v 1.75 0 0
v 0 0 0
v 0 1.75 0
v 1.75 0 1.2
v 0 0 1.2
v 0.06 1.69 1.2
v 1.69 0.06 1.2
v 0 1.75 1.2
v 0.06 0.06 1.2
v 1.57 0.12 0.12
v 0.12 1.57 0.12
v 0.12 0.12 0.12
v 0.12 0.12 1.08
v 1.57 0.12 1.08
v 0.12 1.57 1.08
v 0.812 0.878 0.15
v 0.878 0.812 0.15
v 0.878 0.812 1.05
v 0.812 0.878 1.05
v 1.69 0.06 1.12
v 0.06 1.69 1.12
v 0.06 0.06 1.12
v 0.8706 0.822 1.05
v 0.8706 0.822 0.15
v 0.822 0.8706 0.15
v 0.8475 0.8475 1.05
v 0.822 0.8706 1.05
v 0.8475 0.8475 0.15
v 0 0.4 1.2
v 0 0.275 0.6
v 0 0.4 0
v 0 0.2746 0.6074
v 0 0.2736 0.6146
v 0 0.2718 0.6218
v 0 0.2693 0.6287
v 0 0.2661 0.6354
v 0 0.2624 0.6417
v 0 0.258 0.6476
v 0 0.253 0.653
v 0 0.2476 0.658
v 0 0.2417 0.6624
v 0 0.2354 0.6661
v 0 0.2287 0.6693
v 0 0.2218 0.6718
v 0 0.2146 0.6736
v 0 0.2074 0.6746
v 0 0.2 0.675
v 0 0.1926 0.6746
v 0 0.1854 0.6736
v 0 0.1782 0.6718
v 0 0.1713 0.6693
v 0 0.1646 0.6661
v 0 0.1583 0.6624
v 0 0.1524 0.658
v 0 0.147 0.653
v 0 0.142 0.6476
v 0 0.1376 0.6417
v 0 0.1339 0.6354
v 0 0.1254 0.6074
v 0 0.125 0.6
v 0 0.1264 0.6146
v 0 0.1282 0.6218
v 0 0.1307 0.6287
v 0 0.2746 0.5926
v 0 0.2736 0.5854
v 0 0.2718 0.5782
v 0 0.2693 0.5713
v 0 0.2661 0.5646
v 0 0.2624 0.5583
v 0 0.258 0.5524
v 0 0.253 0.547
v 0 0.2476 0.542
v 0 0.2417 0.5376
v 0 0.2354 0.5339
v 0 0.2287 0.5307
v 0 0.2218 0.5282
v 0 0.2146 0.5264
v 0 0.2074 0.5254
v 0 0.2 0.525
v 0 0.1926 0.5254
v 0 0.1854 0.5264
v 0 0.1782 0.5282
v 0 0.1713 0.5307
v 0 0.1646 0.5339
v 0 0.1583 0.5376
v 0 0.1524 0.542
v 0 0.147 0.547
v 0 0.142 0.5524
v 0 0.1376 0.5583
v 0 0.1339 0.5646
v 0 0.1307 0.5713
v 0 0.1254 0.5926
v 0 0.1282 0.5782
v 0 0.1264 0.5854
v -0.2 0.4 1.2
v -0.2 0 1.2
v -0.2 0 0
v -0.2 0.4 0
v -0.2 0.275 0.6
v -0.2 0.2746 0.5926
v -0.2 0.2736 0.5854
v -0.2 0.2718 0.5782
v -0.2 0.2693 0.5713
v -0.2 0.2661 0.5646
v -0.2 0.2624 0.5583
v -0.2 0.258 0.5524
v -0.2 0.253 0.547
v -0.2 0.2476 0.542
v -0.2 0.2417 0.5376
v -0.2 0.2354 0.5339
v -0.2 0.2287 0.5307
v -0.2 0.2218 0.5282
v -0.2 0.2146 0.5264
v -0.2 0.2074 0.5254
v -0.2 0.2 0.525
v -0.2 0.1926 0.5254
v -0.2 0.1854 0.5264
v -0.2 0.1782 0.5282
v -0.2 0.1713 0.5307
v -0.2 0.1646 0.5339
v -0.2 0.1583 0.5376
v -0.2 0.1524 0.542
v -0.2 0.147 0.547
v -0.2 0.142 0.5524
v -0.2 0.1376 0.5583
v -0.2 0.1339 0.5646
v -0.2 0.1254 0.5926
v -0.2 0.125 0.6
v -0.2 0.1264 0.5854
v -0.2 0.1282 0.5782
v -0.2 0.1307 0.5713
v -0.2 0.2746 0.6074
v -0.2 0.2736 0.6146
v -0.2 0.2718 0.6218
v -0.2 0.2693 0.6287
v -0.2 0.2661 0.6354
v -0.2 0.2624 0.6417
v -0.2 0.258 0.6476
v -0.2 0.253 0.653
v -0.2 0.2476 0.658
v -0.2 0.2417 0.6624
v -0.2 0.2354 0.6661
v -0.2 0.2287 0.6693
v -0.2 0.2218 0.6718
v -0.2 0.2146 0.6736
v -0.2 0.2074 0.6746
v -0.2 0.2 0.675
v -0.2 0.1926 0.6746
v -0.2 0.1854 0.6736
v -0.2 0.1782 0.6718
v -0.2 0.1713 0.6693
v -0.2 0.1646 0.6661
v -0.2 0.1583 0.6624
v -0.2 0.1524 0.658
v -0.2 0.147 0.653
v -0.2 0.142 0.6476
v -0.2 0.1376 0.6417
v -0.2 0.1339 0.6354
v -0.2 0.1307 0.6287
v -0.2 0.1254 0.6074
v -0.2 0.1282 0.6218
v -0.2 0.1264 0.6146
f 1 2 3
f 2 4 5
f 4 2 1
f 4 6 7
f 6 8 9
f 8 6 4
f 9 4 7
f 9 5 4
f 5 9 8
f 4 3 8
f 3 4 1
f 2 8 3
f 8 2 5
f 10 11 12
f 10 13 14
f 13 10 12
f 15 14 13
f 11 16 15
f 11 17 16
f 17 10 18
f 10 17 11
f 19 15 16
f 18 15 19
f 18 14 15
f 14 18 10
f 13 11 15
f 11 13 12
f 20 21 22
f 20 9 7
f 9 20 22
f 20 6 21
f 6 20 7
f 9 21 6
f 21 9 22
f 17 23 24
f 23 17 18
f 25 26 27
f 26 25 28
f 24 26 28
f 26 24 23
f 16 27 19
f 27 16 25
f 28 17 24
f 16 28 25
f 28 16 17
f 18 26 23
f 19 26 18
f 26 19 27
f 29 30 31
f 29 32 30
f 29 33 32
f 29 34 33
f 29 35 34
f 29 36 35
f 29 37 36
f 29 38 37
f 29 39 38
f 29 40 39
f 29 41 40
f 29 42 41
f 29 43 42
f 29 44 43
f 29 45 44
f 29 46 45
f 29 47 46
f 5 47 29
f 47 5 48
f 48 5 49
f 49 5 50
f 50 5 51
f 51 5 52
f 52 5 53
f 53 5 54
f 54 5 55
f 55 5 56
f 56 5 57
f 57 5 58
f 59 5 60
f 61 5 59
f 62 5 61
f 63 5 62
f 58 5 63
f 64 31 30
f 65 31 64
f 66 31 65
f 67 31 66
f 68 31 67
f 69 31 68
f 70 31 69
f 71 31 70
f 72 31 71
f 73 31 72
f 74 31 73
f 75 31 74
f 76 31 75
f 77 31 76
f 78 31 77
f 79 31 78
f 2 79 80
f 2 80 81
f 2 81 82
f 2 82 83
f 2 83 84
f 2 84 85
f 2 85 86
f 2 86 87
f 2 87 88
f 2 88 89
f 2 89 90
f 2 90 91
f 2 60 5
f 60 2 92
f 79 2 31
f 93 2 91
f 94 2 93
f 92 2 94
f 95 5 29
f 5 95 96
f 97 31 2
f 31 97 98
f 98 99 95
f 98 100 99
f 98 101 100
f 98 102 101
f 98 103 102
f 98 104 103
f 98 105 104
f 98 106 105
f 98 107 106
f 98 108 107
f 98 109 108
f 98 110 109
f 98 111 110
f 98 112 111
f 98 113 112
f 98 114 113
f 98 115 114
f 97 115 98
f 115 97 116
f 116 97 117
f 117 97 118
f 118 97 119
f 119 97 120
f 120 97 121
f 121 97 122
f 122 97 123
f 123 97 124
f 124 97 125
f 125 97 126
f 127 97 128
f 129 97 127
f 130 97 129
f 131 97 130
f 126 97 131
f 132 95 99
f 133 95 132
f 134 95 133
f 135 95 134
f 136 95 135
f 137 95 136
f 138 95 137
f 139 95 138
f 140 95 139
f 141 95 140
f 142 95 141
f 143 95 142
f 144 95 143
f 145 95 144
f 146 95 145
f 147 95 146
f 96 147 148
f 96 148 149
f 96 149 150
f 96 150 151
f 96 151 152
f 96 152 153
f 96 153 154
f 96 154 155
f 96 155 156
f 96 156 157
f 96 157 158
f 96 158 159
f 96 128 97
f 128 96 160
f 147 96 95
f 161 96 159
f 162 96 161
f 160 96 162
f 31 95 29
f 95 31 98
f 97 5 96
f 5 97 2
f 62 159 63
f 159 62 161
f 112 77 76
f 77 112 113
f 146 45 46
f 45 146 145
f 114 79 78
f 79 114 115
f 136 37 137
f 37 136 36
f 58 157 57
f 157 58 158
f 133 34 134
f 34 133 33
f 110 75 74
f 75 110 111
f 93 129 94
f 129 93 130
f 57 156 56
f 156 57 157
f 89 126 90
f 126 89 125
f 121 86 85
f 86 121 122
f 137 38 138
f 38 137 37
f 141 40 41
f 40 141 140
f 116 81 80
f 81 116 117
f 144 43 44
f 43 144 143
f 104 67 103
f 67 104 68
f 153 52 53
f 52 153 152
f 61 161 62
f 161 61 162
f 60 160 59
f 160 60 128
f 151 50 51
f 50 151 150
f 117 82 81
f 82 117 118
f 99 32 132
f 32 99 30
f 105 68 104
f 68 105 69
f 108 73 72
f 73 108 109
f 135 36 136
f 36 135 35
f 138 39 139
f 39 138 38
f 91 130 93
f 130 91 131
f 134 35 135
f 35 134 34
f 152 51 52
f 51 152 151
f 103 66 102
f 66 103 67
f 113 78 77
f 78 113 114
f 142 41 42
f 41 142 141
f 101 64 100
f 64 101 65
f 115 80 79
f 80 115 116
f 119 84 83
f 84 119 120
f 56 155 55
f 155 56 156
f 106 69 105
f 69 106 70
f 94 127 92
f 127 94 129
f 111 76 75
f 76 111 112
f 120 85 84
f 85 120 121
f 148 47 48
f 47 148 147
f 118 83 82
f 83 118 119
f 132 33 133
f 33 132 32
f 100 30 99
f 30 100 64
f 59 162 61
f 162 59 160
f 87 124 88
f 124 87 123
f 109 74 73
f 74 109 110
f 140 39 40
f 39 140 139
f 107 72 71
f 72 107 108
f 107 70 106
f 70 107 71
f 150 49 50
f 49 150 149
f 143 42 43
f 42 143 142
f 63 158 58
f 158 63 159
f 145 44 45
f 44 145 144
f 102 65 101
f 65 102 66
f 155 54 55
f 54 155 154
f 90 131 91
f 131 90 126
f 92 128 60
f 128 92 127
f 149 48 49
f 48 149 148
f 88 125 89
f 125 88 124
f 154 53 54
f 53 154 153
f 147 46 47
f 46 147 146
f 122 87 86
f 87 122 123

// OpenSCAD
// Maritime Safety Infrastructure & Fleet Readiness Tracking Module
// Resolution for geometric roundings
$fn = 64; 

// Ruggedized Marine Form Factors (Engineered to withstand heavy sea spray and vibration)
casing_width   = 1.75; // Inches
casing_height  = 1.75; 
casing_length  = 1.20; 
hull_thickness = 0.12; // 3mm reinforced marine-grade protective shell

module maritime_safety_shield() {
    difference() {
        // 1. Primary Structural Chassis Basin (Molded in High-Visibility Safety Red)
        linear_extrude(height = casing_length) {
            polygon(points=[[0,0], [casing_width,0], [0,casing_height]]);
        }
        
        // 2. Sealed Internal Electronic Sanctuary Cavity (Isolates telemetry links)
        translate([hull_thickness, hull_thickness, hull_thickness])
            linear_extrude(height = casing_length - (hull_thickness * 2)) {
                polygon(points=[[0,0], [casing_width - 0.30, 0], [0, casing_height - 0.30]]);
            }
            
        // 3. Continuous Interlocking Gasket Labyrinth Track
        // Seats salt-resistant Viton rubber seals against high-pressure washdowns
        translate([0.06, 0.06, casing_length - 0.08])
            linear_extrude(height = 0.10) {
                polygon(points=[[0,0], [casing_width - 0.12, 0], [0, casing_height - 0.12]]);
            }

        // 4. IP68 Threaded Panel-Mount Data Port Clearance
        // Circular profile designed for heavy-duty threaded marine brass collars
        translate([0.60, 0.60, casing_length / 2])
            rotate([0, 0, -45])
                cylinder(h = 0.9, d = 0.70, center=true); // Sized for double-gasket bulkhead couplers
    }
    
    // 5. Heavy-Duty External Mounting Flanges (For bulkhead or equipment rack fastening)
    translate([-0.20, 0, 0])
        difference() {
            cube([0.20, 0.40, casing_length]);
            translate([0.10, 0.20, casing_length / 2])
                rotate([0, 90, 0])
                    cylinder(h = 0.3, d = 0.15, center=true); // Pass-through hole for marine fasteners
        }
}

// Render the completed maritime infrastructure geometry
maritime_safety_shield();
